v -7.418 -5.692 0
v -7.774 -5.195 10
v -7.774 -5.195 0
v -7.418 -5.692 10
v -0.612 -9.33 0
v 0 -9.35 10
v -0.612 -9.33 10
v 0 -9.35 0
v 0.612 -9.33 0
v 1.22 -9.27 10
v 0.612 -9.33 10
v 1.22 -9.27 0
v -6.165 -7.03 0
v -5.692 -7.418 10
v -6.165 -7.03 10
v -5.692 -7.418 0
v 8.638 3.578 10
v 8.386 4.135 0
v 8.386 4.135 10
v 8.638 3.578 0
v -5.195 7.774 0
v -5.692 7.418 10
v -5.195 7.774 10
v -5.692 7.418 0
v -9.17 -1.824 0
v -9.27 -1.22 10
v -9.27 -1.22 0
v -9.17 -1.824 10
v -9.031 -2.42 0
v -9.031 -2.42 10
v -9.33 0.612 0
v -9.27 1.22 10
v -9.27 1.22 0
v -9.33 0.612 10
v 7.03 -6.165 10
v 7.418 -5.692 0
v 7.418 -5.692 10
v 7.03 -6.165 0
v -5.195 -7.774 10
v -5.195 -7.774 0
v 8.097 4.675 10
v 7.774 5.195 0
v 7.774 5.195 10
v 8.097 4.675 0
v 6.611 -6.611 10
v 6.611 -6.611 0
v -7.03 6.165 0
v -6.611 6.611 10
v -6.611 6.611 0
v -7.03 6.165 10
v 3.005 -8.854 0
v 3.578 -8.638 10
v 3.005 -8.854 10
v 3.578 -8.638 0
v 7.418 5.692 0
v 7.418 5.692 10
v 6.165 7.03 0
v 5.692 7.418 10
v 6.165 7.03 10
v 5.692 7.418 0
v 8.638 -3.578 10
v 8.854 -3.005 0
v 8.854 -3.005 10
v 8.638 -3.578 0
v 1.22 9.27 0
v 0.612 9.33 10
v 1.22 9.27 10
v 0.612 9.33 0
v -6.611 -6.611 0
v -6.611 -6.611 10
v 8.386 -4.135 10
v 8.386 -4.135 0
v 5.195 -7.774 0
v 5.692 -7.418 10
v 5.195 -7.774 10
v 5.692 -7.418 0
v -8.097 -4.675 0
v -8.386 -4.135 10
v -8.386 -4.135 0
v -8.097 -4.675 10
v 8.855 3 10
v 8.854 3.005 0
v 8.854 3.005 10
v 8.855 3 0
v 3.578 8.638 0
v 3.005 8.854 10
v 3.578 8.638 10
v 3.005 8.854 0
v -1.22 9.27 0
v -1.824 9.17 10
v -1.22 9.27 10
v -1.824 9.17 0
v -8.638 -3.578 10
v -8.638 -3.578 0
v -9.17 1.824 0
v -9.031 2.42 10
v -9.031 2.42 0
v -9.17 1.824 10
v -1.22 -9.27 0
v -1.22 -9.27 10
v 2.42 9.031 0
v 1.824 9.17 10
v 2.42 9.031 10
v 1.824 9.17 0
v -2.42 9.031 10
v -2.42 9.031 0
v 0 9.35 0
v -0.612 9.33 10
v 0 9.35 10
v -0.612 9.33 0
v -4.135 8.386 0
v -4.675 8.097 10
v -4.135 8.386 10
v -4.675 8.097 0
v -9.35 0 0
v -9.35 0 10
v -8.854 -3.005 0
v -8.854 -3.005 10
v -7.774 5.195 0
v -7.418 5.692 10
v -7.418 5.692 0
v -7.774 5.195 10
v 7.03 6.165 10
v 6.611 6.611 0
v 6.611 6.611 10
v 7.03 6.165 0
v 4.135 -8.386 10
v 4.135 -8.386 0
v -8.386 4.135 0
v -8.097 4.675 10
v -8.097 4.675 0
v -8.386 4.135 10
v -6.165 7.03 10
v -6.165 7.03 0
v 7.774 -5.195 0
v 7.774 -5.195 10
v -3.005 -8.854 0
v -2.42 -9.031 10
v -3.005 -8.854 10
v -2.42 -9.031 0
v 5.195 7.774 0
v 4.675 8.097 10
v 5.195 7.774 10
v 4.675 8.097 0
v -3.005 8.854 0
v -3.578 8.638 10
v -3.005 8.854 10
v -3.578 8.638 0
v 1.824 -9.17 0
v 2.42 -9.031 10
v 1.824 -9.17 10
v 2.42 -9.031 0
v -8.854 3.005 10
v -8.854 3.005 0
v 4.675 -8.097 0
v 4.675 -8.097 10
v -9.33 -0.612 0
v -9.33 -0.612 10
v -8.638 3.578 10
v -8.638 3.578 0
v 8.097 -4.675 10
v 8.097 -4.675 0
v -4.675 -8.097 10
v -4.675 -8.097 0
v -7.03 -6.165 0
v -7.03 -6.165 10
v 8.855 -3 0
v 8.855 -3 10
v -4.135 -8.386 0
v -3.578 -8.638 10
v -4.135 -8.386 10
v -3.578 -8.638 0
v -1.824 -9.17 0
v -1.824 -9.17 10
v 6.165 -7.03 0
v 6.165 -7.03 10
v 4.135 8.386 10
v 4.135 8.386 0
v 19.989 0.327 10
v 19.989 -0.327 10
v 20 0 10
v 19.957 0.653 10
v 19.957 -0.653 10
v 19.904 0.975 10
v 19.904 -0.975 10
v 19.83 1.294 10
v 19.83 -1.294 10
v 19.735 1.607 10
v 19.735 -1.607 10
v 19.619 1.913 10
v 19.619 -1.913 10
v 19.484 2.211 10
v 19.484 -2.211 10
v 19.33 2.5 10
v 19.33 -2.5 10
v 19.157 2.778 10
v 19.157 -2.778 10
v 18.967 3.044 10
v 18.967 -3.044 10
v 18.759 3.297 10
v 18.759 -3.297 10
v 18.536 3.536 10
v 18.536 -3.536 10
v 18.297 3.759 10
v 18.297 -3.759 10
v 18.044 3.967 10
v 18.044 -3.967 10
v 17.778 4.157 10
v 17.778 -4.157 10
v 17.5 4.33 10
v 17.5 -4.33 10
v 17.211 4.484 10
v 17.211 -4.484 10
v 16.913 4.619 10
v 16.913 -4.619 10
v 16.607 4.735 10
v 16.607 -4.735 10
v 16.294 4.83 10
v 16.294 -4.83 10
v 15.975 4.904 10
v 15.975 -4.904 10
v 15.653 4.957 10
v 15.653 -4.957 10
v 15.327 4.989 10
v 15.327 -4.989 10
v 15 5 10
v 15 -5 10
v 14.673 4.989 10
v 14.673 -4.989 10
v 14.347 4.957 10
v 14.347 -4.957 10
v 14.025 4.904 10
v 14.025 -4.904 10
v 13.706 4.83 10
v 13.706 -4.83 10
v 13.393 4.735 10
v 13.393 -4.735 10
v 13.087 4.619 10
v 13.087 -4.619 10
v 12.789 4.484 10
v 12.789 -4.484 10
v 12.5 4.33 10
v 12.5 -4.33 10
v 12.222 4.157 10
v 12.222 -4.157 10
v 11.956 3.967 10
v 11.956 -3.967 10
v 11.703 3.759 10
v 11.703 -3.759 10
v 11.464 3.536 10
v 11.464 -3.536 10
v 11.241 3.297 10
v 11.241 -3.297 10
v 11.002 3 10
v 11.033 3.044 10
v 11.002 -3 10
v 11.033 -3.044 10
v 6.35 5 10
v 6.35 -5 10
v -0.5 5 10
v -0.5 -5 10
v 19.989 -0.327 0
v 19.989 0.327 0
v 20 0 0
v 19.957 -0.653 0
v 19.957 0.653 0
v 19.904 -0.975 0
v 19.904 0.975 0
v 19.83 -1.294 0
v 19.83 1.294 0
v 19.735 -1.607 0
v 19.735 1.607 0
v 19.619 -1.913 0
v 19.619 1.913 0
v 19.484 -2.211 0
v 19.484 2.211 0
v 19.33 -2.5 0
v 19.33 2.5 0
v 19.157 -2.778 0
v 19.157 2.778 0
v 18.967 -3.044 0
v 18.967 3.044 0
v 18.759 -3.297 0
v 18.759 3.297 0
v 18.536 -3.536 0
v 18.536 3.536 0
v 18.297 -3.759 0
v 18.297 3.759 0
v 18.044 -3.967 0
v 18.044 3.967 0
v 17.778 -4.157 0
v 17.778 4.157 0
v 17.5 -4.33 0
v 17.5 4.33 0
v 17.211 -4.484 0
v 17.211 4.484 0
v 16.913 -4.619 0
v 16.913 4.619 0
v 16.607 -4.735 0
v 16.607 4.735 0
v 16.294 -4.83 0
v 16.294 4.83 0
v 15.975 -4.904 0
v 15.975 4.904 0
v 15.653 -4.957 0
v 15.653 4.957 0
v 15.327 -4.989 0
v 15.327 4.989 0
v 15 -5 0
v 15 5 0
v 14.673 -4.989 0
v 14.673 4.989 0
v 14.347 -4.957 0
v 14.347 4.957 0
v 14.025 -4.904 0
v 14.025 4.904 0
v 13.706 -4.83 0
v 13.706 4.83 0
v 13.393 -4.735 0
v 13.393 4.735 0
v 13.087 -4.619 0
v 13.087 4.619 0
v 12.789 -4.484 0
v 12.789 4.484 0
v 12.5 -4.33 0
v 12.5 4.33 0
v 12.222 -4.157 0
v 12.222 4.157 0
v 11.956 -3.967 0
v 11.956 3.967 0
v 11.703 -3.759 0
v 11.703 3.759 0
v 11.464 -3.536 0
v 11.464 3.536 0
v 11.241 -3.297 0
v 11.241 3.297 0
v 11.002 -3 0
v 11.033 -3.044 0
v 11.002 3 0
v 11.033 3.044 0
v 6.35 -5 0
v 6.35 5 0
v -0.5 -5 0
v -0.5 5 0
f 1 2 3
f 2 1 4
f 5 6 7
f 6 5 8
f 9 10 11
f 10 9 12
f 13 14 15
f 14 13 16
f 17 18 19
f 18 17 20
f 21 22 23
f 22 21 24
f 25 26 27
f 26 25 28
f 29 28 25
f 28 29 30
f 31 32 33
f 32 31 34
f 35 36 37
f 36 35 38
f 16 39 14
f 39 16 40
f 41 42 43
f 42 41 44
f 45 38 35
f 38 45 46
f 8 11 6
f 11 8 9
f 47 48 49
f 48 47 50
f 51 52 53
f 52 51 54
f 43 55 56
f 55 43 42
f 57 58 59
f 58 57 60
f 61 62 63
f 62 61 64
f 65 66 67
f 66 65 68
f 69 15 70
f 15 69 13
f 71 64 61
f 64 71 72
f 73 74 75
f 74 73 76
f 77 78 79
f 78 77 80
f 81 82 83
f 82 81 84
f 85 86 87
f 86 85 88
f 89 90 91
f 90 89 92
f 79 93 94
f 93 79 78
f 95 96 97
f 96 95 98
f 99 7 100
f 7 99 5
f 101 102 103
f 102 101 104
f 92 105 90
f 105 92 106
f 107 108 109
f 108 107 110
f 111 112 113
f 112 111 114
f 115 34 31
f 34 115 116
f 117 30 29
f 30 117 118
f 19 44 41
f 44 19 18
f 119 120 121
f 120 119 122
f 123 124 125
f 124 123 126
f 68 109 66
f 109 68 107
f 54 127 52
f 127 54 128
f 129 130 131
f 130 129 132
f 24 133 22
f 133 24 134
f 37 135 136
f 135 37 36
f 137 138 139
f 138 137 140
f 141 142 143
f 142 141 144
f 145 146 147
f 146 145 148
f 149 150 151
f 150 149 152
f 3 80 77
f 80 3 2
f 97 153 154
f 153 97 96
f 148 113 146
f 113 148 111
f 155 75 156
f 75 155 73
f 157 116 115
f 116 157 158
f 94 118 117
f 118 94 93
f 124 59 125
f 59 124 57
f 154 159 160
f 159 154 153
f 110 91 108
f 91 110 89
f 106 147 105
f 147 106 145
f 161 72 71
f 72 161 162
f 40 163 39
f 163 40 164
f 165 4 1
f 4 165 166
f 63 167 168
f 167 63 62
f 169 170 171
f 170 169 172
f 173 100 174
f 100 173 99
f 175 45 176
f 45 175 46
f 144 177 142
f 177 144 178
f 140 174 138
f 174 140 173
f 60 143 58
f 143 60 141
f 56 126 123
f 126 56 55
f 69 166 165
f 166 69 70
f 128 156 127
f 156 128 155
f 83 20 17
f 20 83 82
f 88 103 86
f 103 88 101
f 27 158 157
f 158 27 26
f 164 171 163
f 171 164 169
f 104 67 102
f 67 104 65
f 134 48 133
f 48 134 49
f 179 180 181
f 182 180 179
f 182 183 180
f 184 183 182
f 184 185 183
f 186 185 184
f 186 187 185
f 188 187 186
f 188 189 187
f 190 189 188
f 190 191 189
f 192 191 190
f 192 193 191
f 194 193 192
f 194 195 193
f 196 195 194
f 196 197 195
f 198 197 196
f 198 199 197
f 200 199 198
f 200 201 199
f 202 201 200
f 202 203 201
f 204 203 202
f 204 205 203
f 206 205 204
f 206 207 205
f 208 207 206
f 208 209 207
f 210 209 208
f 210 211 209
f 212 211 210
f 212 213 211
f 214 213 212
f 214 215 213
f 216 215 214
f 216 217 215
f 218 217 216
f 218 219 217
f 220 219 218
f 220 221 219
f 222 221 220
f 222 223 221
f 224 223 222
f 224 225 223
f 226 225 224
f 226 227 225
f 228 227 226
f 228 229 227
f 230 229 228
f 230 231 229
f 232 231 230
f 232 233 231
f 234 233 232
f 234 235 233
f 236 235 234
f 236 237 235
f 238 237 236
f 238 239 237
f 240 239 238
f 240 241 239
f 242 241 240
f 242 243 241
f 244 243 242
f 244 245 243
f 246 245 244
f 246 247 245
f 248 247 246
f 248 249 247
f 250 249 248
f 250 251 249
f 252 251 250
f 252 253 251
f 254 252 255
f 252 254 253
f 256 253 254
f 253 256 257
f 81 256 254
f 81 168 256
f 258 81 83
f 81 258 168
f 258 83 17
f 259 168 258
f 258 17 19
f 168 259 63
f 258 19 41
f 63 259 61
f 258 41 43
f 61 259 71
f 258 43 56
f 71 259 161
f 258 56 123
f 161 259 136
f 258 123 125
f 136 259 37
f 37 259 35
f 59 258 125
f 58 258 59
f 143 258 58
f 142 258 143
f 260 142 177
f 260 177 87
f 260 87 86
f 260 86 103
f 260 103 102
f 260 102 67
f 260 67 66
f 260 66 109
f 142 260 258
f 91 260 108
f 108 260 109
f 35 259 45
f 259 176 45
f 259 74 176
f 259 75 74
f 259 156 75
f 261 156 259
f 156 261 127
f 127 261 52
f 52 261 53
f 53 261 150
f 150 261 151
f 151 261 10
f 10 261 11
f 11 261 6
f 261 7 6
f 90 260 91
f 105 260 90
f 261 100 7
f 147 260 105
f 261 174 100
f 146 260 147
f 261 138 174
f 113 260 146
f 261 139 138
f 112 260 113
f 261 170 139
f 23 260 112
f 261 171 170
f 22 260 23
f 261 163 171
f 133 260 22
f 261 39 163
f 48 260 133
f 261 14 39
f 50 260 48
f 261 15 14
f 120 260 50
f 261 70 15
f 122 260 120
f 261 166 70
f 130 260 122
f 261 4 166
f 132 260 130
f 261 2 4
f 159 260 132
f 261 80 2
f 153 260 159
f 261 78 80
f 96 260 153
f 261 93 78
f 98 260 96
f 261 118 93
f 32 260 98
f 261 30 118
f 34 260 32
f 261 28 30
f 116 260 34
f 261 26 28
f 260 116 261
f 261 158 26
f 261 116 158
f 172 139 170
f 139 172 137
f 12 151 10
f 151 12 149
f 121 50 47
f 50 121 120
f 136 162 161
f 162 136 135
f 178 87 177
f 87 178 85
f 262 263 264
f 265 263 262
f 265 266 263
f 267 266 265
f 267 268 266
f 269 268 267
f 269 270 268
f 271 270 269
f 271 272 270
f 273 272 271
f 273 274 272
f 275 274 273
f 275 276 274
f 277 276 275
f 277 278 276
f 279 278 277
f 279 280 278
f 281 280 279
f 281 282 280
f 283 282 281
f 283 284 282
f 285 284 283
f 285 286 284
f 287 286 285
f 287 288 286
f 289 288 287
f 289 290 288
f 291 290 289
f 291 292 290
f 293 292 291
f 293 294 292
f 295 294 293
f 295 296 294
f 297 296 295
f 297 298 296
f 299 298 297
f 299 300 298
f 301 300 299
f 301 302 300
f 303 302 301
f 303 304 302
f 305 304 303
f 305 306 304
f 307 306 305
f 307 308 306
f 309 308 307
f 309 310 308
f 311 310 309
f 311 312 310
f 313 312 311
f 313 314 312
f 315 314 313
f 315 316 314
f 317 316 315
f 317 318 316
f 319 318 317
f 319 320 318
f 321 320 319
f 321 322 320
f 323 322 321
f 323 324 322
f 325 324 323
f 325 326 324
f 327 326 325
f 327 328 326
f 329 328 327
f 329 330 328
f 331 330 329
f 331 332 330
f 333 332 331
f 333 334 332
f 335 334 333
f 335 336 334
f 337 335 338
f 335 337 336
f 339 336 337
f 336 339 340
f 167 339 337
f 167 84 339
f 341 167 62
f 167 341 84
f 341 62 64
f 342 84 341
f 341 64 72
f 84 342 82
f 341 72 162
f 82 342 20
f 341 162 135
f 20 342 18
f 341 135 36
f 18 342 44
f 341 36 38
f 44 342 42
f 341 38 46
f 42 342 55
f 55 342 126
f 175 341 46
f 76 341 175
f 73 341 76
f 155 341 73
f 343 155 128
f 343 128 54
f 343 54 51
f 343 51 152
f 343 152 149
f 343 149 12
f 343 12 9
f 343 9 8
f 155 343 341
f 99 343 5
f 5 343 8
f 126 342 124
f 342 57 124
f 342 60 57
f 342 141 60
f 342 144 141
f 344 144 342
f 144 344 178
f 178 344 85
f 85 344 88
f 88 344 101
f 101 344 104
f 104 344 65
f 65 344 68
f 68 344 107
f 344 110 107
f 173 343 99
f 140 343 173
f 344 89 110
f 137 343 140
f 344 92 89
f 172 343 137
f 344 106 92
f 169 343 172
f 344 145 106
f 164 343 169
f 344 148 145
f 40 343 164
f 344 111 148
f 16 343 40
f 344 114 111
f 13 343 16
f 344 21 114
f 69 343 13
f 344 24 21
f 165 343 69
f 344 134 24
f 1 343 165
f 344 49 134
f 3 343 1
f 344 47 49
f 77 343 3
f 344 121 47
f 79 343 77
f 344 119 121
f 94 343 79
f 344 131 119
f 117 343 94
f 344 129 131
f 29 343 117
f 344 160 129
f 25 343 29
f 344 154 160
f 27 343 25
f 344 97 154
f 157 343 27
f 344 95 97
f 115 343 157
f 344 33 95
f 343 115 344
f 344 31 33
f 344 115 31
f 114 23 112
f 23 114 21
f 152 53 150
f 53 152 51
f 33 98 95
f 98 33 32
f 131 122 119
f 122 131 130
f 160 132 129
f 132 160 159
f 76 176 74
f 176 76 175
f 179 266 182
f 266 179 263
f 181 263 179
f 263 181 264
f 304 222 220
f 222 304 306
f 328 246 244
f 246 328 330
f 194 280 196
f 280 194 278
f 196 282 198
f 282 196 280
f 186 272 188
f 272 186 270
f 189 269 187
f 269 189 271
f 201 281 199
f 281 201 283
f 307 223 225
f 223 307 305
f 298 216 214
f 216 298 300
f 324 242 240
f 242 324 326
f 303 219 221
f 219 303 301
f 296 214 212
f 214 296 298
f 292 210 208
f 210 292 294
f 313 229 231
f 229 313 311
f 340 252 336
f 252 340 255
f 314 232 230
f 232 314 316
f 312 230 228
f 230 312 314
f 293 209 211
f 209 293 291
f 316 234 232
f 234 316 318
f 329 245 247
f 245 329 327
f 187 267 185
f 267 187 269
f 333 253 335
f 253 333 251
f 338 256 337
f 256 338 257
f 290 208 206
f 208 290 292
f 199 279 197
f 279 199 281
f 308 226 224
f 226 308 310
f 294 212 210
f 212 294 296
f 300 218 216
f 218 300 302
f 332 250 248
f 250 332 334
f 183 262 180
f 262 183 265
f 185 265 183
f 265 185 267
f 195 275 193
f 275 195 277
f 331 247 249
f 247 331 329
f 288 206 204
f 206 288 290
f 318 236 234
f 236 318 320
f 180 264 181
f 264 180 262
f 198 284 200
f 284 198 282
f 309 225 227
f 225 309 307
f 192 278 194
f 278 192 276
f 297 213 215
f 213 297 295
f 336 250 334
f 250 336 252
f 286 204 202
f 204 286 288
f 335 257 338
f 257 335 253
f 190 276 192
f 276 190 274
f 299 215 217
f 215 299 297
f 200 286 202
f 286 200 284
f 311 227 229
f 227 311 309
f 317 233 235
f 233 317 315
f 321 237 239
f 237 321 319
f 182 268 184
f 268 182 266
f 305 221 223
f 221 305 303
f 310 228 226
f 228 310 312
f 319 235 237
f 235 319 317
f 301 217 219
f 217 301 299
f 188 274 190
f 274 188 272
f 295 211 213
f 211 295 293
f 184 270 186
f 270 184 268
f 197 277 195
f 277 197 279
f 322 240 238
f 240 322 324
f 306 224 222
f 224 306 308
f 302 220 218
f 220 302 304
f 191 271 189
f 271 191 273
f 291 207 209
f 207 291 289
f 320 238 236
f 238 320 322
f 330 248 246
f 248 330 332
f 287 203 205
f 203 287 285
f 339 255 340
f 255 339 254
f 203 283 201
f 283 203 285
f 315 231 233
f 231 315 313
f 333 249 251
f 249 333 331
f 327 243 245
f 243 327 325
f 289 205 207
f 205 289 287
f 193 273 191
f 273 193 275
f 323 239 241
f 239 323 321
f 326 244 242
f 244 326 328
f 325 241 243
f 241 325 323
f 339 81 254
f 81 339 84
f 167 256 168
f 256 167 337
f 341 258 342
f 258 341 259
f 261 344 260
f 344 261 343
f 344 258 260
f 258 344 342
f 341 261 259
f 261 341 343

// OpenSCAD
// Tubing clip for a 12.7 mm lab stand rod
// Print orientation: flat on the bed, extruded upward along +Z

// ---------------- Parameters ----------------
ring_id      = 12.7;   // rod ring inner diameter (stand rod clearance)
ring_wall    = 3;      // rod ring wall thickness
ring_od      = ring_id + 2 * ring_wall; // rod ring outer diameter (18.7)
ring_x0      = 0;      // rod ring centre X
ring_y0      = 0;      // rod ring centre Y

tube_id      = 6;      // tubing ring inner diameter
tube_wall    = 2;      // tubing ring wall thickness
tube_od      = tube_id + 2 * tube_wall; // tubing ring outer diameter (10)
tube_x0      = 15;     // tubing ring centre X
tube_y0      = 0;      // tubing ring centre Y

bridge_x0    = 10;     // bridge centre X (between x = 8 and x = 12)
bridge_x1    = 8;      // bridge start X
bridge_x2    = 12;     // bridge end X
bridge_w     = 6;      // bridge width along Y

eps          = 0.5;    // cutter overshoot past faces

$fn = 96;

// ---------------- Model ----------------
difference() {
    union() {
        // Rod ring
        cylinder(d = ring_od, h = 10);
        // Tubing ring
        translate([tube_x0, tube_y0, 0])
            cylinder(d = tube_od, h = 10);
        // Solid bridge
        translate([bridge_x1, -bridge_w / 2, 0])
            cube([bridge_x2 - bridge_x1, bridge_w, 10]);
    }

    // Rod ring opening: full -X side where x < 0 and -5 < y < 5
    translate([ring_x0 - eps, ring_y0 - 5, -eps])
        cube([ring_id / 2 + eps, 10, 10 + eps]);

    // Tubing ring opening: +X side where x > 15 and -2.25 < y < 2.25
    translate([tube_x0, tube_y0 - 2.25, -eps])
        cube([tube_od - tube_x0 + eps, 4.5, 10 + eps]);
}
